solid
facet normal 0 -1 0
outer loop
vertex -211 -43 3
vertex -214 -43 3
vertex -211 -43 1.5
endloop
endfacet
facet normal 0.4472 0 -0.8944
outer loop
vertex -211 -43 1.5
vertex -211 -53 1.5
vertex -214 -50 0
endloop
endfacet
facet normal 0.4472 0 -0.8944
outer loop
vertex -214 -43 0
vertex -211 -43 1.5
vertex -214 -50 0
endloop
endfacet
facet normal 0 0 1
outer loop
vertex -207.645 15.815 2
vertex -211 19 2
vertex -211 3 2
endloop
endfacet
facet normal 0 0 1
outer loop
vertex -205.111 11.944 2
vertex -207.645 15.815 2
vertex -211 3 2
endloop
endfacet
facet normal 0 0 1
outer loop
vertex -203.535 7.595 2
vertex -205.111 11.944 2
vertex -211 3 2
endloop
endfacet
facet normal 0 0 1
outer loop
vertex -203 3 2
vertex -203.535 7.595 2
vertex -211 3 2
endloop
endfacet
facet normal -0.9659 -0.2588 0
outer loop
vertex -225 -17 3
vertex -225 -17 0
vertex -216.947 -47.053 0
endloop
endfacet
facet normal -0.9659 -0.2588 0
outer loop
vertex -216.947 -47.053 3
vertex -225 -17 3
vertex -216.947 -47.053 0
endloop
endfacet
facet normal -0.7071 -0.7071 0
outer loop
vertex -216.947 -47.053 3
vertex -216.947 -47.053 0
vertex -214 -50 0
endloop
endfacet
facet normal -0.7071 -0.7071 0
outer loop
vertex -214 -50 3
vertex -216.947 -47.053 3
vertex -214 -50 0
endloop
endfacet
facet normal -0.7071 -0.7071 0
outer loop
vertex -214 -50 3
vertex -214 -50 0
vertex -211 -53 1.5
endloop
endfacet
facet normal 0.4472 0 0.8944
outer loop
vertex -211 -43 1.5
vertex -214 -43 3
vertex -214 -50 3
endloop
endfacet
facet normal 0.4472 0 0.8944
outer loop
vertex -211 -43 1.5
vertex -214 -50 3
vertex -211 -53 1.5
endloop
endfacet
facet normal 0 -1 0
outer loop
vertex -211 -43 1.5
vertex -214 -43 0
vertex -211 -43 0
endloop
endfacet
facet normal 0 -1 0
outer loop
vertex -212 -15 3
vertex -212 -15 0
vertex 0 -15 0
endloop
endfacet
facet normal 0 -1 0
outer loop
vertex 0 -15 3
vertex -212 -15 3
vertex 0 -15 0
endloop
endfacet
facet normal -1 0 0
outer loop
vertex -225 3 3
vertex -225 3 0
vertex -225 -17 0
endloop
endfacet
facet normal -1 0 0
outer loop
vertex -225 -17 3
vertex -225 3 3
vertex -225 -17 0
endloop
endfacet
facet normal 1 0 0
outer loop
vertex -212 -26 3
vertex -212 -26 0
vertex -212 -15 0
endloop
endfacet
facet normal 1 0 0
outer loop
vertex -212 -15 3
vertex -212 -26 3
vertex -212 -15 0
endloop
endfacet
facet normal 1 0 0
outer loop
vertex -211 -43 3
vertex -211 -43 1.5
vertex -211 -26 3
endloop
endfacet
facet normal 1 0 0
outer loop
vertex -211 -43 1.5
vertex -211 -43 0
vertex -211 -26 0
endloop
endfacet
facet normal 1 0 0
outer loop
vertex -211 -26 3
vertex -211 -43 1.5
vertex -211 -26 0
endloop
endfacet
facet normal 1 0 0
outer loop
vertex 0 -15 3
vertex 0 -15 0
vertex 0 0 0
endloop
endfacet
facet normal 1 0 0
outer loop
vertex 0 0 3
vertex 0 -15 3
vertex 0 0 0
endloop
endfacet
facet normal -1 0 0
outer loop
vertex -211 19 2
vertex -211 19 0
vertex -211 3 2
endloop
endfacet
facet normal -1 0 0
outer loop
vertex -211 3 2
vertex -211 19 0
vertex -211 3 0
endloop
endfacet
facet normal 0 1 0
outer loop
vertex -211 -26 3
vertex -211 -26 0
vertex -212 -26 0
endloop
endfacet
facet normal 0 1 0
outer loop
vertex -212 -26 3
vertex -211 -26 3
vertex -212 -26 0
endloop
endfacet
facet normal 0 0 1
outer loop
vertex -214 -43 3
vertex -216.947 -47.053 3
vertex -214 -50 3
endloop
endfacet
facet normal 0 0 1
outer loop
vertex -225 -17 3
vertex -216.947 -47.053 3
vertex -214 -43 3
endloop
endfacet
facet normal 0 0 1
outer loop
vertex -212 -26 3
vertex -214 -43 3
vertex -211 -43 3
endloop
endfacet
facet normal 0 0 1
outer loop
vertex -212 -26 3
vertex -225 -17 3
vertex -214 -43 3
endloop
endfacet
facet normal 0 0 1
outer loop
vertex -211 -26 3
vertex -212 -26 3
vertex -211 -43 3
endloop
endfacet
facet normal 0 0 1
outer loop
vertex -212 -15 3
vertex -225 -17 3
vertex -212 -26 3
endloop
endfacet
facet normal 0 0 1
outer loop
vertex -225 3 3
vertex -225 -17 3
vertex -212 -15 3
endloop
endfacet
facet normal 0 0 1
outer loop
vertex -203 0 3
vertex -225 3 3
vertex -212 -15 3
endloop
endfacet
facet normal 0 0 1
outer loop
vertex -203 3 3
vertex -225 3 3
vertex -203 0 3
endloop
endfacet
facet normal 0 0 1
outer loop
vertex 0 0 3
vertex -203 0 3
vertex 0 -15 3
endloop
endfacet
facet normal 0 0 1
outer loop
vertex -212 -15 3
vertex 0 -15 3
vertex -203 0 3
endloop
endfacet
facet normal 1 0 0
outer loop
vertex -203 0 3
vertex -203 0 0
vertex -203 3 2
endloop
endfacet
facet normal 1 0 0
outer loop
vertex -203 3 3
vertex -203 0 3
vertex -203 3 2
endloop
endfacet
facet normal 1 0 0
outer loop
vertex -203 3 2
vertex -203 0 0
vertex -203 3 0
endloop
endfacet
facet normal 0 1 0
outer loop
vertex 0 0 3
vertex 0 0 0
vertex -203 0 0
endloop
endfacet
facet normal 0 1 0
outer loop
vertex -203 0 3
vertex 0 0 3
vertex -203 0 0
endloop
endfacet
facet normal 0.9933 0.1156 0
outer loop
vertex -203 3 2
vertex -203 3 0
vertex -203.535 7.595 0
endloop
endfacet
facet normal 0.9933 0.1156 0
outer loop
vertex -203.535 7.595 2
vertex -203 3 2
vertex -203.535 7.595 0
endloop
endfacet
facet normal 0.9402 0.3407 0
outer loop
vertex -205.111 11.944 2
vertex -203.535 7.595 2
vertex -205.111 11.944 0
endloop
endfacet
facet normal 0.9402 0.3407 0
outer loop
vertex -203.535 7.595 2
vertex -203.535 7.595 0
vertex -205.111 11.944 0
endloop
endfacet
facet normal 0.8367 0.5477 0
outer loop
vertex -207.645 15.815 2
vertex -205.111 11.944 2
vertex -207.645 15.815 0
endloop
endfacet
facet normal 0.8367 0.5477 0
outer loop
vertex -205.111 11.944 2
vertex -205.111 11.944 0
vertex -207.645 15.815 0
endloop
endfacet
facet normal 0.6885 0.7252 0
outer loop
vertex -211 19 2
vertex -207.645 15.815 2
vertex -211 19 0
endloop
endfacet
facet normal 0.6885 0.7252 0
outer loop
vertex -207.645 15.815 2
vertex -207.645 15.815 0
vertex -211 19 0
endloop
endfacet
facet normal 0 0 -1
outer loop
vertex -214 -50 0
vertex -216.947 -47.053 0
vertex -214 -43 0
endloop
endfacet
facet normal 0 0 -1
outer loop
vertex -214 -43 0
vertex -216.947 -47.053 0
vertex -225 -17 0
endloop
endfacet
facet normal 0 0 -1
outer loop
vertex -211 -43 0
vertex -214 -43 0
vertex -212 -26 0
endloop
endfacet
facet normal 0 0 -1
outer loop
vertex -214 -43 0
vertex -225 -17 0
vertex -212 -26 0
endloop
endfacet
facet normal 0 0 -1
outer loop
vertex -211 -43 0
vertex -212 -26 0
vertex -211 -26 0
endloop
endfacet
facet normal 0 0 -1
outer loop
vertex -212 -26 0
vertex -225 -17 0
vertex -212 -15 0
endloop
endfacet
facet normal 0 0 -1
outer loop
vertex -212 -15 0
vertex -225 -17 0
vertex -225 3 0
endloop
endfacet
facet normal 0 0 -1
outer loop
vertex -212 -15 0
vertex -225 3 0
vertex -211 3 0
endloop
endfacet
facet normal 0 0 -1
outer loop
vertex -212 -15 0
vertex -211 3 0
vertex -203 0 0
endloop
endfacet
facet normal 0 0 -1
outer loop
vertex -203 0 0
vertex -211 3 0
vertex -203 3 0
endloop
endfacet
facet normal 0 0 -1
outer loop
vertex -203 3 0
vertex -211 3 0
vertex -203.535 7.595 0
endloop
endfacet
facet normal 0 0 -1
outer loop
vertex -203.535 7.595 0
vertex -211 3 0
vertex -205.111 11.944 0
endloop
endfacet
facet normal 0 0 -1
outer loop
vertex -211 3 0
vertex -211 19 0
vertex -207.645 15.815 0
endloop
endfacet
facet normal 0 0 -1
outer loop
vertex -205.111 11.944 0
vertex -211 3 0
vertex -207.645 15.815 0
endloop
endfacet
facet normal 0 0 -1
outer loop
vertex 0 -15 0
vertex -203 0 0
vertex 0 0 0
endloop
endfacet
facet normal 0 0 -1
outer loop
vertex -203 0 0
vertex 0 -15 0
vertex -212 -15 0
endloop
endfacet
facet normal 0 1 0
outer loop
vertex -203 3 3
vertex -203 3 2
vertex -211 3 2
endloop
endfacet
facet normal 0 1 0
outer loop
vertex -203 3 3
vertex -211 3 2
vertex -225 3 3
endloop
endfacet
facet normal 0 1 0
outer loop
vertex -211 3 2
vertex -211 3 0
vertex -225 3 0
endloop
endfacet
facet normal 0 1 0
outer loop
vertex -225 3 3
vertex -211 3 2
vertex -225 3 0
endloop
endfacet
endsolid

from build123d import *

# Parameters (mm, degrees)
F1_DEPTH = 3
F2_W     = 16
F2_H     = 1
F3_DEPTH = 10
F6_DEPTH = 10


with BuildPart() as f1:
    # F0 (on Top) → F1 (new body)
    with BuildSketch(Plane.XY):
        Polygon((0, -15), (0, 0), (-203, 0), (-203, 3), (-211, 3), (-225, 3), (-225, -17), (-216.947441, -47.052559), (-211, -53), (-211, -26), (-212, -26), (-212, -15), align=None)
        with BuildLine():
            Line((-211, 3), (-203, 3))
            ThreePointArc((-203, 3), (-205.111456, 11.944272), (-211, 19))
            Line((-211, 19), (-211, 3))
        make_face()
    extrude(amount=F1_DEPTH)

    # F2 (on face) → F3 (cut)
    with BuildSketch(Plane(origin=(-211, 0, 0), x_dir=(0, -1, 0), z_dir=(-1, 0, 0))):
        with Locations((-11, 2.5)):
            Rectangle(F2_W, F2_H)
    extrude(amount=-F3_DEPTH, mode=Mode.SUBTRACT)

    # F5 (on offset) → F6 (cut)
    with BuildSketch(Plane.XZ.offset(53)):
        Polygon((-214, 3), (-211, 1.5), (-214, 0), (-206, 0), (-206, 3), align=None)
    extrude(amount=-F6_DEPTH, mode=Mode.SUBTRACT)


solid = f1.part
